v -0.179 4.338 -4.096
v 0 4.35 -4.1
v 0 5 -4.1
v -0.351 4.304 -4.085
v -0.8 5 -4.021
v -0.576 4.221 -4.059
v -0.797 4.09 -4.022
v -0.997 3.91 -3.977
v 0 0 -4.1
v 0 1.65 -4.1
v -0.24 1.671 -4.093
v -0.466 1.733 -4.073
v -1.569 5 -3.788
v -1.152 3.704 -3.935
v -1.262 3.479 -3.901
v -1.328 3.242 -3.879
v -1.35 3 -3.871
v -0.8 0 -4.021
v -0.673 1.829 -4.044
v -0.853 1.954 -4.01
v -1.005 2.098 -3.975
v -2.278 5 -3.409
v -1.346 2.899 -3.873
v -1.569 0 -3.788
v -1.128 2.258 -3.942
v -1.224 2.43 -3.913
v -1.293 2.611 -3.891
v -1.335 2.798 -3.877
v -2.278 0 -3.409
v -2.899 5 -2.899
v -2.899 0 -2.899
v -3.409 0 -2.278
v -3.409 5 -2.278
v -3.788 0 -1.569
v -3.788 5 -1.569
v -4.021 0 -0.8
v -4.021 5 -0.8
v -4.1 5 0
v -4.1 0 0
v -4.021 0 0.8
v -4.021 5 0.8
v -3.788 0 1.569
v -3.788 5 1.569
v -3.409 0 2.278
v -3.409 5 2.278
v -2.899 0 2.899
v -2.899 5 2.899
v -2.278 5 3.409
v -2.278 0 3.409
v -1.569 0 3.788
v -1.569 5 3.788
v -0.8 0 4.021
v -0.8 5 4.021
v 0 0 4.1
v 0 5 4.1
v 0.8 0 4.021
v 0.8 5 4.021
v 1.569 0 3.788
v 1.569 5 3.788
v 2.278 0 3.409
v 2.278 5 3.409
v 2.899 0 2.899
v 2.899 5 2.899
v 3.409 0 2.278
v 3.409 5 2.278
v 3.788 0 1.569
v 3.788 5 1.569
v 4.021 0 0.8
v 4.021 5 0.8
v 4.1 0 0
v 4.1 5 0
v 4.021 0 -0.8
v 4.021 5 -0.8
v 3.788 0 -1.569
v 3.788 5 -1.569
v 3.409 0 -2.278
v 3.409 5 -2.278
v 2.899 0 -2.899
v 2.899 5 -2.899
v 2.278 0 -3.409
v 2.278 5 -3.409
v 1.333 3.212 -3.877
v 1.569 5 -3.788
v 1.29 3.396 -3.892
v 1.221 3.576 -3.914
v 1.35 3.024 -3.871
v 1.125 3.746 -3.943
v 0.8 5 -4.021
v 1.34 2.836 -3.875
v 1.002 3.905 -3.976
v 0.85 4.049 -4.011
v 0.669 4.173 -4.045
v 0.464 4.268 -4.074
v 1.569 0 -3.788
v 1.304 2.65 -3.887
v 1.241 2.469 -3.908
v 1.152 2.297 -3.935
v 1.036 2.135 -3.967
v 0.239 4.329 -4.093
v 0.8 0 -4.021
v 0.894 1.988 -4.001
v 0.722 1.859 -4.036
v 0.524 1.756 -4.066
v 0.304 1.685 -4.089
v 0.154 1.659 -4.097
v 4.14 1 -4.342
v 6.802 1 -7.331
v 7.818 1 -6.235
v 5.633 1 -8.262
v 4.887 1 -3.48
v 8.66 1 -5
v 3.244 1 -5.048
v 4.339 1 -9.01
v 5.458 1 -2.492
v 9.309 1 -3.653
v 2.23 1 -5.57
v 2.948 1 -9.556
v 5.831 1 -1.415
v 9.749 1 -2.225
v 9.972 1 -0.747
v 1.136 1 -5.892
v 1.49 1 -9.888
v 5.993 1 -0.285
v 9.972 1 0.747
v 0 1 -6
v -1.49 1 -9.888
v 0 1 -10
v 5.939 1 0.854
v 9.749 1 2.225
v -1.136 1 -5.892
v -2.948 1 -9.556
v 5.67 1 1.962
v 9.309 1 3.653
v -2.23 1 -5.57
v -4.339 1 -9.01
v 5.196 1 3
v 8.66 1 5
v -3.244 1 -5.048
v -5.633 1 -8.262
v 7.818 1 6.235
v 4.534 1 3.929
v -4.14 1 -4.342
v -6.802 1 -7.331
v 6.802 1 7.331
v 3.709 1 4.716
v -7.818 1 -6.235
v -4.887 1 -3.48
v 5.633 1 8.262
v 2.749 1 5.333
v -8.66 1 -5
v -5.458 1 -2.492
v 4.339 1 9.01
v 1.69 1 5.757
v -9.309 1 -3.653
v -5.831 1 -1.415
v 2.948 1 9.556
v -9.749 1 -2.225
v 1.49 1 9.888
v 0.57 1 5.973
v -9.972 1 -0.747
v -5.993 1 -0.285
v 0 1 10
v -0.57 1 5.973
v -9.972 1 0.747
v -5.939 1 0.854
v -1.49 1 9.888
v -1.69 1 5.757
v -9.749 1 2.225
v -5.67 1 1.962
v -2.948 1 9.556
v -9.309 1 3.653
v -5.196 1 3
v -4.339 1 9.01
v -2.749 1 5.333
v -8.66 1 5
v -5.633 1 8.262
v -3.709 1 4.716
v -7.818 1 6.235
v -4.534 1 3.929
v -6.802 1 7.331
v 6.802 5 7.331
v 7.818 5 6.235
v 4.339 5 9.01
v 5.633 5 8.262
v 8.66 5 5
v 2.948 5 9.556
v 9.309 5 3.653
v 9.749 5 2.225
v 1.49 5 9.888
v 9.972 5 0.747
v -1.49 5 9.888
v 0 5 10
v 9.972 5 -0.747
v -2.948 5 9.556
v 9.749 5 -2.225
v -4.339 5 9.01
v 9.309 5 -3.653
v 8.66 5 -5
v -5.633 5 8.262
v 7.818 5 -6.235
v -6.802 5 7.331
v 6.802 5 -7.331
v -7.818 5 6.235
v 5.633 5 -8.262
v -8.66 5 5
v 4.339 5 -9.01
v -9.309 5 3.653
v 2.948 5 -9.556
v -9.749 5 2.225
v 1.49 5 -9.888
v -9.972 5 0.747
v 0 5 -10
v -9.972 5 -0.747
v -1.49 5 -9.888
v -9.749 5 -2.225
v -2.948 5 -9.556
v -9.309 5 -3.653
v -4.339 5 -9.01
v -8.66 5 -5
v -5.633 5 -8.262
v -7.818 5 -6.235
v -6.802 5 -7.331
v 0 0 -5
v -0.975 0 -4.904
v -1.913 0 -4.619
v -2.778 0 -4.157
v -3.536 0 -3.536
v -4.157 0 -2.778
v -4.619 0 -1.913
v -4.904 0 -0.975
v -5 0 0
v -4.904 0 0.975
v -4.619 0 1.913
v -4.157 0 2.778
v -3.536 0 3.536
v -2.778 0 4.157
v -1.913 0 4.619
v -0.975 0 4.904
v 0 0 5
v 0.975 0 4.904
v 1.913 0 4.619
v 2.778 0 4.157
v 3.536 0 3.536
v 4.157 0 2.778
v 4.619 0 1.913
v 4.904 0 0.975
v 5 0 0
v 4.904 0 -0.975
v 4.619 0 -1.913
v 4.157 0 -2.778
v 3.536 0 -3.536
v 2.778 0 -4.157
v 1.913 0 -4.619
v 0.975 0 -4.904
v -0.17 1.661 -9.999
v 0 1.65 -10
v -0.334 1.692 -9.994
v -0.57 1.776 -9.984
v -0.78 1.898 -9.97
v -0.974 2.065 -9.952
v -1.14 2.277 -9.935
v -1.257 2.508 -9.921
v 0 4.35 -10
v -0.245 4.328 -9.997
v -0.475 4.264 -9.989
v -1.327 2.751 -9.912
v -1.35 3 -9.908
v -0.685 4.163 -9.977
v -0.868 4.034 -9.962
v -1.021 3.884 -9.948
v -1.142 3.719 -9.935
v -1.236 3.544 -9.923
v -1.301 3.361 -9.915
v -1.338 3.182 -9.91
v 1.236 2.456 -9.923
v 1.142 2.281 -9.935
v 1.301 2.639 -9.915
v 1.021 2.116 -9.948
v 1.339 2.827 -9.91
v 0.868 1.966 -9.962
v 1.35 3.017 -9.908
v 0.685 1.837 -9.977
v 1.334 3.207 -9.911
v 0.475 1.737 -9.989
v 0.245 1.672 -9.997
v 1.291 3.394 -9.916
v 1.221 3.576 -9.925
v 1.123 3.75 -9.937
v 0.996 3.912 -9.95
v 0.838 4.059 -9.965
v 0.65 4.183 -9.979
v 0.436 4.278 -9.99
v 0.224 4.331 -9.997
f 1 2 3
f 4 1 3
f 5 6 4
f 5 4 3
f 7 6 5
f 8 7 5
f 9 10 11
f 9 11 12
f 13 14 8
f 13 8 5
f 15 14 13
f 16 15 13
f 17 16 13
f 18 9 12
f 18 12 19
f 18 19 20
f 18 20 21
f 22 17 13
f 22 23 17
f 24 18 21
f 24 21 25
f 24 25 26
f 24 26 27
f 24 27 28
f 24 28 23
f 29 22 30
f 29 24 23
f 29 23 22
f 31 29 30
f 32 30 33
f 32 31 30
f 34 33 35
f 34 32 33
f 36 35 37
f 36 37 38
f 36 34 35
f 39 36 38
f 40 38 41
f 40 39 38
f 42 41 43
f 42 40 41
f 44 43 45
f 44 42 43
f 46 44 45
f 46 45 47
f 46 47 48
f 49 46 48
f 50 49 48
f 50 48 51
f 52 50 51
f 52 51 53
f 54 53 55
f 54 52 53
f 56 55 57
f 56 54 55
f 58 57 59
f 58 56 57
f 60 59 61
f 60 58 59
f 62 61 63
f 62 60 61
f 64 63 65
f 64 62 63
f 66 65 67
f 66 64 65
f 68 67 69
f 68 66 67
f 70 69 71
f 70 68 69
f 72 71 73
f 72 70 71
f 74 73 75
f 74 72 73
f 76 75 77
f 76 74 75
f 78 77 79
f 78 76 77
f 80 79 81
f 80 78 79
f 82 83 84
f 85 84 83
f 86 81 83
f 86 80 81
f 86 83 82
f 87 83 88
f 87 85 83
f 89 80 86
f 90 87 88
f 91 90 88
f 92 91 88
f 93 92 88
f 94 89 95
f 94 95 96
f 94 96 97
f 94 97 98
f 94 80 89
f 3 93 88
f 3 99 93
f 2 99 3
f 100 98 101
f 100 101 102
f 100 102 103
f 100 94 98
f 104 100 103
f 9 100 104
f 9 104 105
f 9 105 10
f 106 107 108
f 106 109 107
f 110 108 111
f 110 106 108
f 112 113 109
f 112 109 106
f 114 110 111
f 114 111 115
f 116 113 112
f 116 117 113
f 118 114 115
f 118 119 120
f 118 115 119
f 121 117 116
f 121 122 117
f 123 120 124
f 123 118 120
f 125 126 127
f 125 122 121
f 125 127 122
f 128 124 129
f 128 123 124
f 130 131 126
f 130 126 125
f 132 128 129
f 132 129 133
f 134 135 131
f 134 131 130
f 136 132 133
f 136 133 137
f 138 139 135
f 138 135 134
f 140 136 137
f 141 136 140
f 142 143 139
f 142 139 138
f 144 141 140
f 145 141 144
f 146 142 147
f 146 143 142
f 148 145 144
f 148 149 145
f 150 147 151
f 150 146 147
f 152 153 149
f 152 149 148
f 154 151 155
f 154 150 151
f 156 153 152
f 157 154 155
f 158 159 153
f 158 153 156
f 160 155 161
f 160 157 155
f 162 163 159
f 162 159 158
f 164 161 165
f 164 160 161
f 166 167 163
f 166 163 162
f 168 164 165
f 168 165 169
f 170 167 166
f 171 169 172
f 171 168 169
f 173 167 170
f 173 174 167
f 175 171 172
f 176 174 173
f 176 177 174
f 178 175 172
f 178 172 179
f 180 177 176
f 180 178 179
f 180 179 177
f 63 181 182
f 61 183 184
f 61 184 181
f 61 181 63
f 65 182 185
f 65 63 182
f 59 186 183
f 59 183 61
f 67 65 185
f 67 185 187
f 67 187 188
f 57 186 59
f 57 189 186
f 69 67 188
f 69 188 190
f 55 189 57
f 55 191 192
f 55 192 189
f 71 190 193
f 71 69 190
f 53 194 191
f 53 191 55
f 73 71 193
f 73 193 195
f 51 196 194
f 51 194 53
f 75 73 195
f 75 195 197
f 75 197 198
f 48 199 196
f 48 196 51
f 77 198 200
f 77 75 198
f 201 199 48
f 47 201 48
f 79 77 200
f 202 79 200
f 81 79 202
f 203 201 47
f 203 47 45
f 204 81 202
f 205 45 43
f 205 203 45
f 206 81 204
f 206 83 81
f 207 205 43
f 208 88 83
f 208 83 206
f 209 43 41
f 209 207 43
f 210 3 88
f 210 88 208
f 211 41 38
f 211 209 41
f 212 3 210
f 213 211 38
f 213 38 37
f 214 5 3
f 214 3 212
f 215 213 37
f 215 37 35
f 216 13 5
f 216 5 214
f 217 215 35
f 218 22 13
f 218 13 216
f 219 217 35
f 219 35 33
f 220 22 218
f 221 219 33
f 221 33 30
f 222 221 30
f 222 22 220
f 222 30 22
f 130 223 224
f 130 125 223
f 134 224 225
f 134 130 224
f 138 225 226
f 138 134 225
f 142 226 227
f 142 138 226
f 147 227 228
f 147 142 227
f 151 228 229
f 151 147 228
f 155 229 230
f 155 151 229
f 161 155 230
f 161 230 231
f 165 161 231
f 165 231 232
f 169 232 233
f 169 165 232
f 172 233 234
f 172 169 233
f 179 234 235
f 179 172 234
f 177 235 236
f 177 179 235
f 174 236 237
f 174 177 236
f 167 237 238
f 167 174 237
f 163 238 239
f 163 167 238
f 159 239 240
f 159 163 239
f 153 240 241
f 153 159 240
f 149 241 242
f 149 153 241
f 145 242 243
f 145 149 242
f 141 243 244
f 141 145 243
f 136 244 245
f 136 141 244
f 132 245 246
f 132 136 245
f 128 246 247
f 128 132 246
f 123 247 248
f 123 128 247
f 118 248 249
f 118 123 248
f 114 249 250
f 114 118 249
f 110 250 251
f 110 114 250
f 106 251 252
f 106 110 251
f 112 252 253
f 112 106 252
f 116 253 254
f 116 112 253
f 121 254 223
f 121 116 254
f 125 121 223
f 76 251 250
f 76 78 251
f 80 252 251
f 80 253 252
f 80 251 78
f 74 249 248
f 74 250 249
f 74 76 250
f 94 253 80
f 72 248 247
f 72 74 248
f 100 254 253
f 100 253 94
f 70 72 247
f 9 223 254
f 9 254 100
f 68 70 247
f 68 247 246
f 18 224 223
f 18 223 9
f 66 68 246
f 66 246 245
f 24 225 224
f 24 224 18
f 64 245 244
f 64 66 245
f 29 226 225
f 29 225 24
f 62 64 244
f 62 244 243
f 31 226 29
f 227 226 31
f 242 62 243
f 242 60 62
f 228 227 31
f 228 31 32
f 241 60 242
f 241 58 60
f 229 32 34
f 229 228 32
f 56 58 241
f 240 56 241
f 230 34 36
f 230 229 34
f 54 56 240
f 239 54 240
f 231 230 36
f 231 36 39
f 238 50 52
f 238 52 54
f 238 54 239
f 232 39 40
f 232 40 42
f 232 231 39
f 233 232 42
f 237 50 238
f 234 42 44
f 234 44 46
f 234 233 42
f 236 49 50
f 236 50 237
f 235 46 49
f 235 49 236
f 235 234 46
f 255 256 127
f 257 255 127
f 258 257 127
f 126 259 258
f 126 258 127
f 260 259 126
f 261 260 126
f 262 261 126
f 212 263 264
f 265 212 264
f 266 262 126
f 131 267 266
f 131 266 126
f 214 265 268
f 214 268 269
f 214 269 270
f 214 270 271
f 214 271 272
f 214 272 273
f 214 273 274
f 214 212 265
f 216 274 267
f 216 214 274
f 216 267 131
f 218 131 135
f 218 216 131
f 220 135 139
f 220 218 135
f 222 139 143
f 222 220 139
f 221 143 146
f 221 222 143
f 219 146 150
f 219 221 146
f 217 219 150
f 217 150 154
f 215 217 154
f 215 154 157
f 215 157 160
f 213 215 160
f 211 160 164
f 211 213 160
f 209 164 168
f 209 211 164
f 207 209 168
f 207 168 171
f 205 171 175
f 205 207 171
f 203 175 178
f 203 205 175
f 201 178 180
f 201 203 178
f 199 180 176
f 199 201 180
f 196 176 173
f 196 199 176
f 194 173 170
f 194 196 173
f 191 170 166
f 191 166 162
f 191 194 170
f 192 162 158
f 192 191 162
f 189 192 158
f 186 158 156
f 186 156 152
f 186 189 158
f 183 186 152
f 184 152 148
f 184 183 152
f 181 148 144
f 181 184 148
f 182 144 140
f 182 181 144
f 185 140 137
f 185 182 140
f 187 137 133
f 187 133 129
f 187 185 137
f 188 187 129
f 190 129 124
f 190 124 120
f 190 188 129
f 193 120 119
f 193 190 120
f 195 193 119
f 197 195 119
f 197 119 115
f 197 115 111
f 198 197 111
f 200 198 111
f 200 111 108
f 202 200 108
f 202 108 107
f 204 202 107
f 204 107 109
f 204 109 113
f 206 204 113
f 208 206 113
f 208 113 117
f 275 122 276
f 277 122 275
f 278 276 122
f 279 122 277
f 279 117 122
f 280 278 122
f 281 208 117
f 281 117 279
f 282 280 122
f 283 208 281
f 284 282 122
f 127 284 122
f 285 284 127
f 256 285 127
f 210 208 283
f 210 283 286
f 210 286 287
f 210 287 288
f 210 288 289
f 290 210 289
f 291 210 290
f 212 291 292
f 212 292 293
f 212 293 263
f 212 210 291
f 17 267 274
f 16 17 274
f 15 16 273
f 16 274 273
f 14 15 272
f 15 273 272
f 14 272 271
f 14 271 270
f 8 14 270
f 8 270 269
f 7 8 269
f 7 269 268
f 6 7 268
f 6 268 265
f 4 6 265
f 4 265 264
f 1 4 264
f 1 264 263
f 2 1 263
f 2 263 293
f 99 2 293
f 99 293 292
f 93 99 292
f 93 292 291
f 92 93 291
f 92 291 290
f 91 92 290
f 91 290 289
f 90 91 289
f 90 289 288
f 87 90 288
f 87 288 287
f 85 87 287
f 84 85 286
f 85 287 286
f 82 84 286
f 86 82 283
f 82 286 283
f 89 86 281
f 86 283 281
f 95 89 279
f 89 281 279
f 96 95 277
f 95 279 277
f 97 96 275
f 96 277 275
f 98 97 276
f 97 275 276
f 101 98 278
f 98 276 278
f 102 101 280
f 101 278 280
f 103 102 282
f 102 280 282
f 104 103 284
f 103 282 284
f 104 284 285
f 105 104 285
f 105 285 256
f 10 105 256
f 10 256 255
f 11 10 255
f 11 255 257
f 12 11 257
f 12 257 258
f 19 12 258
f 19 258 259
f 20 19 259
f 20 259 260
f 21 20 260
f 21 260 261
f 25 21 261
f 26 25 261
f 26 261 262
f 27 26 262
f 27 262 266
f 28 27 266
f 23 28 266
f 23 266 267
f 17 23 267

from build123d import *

# Parameters (mm, degrees)
F_2_7_2_7_DIAMETER_HOLE1_REACH  = 24.913
F_2_7_2_7_DIAMETER_HOLE1_BORE_R = 1.35


with BuildPart() as part:
    # Sketch1 → Revolve1 (revolve)
    with BuildSketch(Plane(origin=(0, 0, 0), x_dir=(0, 0, -1), z_dir=(1, 0, 0)), mode=Mode.PRIVATE) as revolve1_sk:
        Polygon((-4.1, 0), (-5, 0), (-6, 1), (-10, 1), (-10, 5), (-4.1, 5), align=None)
    revolve(revolve1_sk.sketch.rotate(Axis((0, 0, 0), (0, 1, 0)), 180), axis=Axis((0, 0, 0), (0, 1, 0)))

    # Ø2.7 (2.7) Diameter Hole1 bore → Ø2.7 (2.7) Diameter Hole1 (cut, up to next)
    with BuildSketch(Plane(origin=(0, 0, -10), x_dir=(-1, 0, 0), z_dir=(0, 0, -1)), mode=Mode.PRIVATE) as f_2_7_2_7_diameter_hole1_sk1:
        with Locations((0, 3)):
            Circle(F_2_7_2_7_DIAMETER_HOLE1_BORE_R)
    f_2_7_2_7_diameter_hole1_tool1 = extrude(f_2_7_2_7_diameter_hole1_sk1.sketch, amount=-F_2_7_2_7_DIAMETER_HOLE1_REACH, mode=Mode.PRIVATE) & part.part
    add(f_2_7_2_7_diameter_hole1_tool1.solids().sort_by_distance((0, 3, -10))[0], mode=Mode.SUBTRACT)


solid = part.part
